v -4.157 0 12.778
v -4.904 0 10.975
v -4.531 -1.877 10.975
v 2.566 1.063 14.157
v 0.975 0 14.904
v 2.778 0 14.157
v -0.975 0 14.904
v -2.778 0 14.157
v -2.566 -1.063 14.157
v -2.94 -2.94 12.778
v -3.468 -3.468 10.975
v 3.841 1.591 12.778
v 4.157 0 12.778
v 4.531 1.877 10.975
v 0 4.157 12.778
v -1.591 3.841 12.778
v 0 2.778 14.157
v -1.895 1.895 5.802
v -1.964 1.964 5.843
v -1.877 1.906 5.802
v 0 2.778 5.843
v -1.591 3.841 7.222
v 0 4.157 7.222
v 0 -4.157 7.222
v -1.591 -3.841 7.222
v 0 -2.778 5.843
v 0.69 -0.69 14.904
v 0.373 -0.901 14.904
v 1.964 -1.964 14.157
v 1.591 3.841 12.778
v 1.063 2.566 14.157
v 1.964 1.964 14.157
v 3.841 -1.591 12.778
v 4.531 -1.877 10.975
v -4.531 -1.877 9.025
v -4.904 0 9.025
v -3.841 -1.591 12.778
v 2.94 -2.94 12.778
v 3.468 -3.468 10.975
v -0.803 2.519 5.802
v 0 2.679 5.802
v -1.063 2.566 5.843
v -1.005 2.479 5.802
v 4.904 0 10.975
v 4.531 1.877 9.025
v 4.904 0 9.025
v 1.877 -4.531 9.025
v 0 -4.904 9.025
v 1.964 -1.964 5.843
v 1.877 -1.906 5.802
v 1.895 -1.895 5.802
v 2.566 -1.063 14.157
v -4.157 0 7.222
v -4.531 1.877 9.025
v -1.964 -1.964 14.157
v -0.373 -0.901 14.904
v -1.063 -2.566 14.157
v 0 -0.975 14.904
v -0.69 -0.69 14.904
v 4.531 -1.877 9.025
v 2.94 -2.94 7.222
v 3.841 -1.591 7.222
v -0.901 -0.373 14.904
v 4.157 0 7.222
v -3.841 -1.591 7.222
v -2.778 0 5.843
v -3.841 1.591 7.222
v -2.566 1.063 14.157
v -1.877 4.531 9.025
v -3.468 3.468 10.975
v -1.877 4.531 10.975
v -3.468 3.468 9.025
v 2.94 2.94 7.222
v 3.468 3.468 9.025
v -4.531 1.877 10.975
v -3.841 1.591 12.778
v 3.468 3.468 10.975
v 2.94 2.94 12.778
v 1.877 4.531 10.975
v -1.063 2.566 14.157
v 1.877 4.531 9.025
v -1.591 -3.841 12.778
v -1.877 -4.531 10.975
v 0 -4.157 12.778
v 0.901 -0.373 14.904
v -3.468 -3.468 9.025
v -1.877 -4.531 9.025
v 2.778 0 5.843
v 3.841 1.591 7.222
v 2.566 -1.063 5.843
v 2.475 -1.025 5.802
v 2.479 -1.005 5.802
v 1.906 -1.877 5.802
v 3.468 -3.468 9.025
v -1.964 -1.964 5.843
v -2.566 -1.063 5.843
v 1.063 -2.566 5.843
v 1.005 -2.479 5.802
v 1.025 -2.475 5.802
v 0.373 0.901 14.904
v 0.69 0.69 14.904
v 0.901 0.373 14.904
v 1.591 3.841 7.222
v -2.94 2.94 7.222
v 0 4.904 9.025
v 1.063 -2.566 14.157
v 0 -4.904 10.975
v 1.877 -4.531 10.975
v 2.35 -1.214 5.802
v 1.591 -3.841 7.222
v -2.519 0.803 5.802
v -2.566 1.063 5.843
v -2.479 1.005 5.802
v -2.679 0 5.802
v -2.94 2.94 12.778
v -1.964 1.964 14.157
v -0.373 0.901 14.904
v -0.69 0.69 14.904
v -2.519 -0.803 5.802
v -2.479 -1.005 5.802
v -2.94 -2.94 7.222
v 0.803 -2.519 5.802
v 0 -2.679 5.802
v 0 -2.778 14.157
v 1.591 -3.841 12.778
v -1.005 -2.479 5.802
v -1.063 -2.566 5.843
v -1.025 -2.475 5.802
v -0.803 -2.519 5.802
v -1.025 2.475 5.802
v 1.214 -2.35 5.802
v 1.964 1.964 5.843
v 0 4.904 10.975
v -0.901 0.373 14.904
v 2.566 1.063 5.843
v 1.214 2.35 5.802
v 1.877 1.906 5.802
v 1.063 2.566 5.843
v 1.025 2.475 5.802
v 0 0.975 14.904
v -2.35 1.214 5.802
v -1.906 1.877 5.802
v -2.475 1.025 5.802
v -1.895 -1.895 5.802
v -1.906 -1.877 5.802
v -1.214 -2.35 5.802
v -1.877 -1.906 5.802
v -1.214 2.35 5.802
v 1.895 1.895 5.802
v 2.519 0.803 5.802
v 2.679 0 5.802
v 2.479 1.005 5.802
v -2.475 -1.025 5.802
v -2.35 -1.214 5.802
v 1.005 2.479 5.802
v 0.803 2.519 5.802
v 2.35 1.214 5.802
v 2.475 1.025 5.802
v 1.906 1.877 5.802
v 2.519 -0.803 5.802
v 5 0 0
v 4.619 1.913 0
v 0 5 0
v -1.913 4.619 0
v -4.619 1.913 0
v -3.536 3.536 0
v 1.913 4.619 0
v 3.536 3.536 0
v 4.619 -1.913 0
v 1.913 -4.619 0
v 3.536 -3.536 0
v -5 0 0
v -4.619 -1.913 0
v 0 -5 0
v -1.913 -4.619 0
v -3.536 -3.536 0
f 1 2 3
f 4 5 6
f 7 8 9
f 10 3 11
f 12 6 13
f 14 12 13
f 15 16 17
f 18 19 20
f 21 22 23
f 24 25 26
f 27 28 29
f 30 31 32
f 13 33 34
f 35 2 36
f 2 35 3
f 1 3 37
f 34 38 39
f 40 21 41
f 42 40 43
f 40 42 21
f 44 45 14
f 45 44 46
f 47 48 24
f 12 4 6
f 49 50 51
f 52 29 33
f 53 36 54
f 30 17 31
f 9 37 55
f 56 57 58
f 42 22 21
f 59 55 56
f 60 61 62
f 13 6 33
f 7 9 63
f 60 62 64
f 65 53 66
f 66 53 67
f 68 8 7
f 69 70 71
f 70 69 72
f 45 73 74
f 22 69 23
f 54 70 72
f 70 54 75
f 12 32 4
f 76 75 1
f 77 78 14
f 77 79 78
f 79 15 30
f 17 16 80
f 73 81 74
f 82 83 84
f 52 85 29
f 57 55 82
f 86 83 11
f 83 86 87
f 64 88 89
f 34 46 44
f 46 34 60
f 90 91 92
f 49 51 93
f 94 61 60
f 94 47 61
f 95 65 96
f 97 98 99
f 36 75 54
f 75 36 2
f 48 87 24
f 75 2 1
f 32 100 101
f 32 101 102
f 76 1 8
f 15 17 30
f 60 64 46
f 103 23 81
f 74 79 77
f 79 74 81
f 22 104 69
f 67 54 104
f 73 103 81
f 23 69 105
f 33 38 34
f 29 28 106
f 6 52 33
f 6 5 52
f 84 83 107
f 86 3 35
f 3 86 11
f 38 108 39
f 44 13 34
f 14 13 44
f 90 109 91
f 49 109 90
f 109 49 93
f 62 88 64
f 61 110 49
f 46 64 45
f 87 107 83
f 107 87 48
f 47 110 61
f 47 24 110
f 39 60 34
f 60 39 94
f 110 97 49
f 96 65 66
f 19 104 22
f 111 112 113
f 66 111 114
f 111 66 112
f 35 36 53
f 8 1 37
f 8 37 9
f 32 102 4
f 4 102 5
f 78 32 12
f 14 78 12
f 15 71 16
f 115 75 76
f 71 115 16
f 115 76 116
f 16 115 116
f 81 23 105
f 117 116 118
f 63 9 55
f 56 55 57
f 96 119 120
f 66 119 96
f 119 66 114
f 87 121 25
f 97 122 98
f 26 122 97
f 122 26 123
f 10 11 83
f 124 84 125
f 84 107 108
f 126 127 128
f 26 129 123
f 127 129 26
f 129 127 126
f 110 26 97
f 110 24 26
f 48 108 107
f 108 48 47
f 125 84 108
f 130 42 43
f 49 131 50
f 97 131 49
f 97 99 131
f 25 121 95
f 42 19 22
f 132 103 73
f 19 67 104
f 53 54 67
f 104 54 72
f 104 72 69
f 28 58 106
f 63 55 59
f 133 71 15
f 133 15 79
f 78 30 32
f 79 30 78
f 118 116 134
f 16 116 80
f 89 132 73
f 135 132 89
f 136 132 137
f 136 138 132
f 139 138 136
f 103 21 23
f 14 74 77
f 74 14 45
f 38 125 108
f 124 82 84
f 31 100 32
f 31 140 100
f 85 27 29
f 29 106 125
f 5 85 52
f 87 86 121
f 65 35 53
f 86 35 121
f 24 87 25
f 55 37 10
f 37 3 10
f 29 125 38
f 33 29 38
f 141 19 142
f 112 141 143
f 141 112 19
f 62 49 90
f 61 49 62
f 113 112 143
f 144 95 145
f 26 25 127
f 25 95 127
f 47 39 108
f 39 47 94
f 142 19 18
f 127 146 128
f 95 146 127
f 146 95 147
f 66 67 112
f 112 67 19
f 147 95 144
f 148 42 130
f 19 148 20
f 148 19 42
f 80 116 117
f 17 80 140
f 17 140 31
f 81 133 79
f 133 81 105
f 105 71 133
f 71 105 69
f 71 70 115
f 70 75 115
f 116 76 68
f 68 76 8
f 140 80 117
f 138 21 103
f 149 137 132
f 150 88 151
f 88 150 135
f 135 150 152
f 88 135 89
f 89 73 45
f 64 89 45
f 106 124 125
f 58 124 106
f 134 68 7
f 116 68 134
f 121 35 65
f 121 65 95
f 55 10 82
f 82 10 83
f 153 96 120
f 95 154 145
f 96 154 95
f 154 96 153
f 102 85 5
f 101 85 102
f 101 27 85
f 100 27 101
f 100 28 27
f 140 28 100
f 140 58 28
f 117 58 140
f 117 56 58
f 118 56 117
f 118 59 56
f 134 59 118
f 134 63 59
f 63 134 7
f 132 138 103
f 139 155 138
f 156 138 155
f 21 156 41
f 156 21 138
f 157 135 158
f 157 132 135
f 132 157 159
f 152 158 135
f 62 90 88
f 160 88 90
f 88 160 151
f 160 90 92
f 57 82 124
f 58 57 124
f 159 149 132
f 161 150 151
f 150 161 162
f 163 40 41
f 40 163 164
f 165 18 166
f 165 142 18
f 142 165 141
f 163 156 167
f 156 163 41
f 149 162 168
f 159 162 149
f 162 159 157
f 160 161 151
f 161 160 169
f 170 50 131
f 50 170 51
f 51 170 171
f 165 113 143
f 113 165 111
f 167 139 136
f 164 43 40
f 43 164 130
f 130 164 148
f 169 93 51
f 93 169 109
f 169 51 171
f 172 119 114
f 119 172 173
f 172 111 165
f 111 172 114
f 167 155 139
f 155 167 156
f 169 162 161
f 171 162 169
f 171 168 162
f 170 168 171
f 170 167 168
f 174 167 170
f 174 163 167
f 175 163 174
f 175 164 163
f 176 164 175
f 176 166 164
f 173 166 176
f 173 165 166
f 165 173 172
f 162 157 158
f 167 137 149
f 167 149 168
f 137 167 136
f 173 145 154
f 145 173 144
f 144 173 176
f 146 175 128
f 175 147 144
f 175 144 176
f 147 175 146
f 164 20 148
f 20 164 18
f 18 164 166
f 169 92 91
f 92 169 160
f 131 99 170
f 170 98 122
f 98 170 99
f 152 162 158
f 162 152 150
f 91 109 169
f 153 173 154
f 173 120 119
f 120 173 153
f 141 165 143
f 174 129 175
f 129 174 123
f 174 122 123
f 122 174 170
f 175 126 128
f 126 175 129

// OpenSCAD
head = 5;
neck = 5;
body = 10;

module pawn(head, neck, body){
    translate([0,0,10]){sphere(head);}
    cylinder(body, neck);
}

pawn(5, 5, 10);
